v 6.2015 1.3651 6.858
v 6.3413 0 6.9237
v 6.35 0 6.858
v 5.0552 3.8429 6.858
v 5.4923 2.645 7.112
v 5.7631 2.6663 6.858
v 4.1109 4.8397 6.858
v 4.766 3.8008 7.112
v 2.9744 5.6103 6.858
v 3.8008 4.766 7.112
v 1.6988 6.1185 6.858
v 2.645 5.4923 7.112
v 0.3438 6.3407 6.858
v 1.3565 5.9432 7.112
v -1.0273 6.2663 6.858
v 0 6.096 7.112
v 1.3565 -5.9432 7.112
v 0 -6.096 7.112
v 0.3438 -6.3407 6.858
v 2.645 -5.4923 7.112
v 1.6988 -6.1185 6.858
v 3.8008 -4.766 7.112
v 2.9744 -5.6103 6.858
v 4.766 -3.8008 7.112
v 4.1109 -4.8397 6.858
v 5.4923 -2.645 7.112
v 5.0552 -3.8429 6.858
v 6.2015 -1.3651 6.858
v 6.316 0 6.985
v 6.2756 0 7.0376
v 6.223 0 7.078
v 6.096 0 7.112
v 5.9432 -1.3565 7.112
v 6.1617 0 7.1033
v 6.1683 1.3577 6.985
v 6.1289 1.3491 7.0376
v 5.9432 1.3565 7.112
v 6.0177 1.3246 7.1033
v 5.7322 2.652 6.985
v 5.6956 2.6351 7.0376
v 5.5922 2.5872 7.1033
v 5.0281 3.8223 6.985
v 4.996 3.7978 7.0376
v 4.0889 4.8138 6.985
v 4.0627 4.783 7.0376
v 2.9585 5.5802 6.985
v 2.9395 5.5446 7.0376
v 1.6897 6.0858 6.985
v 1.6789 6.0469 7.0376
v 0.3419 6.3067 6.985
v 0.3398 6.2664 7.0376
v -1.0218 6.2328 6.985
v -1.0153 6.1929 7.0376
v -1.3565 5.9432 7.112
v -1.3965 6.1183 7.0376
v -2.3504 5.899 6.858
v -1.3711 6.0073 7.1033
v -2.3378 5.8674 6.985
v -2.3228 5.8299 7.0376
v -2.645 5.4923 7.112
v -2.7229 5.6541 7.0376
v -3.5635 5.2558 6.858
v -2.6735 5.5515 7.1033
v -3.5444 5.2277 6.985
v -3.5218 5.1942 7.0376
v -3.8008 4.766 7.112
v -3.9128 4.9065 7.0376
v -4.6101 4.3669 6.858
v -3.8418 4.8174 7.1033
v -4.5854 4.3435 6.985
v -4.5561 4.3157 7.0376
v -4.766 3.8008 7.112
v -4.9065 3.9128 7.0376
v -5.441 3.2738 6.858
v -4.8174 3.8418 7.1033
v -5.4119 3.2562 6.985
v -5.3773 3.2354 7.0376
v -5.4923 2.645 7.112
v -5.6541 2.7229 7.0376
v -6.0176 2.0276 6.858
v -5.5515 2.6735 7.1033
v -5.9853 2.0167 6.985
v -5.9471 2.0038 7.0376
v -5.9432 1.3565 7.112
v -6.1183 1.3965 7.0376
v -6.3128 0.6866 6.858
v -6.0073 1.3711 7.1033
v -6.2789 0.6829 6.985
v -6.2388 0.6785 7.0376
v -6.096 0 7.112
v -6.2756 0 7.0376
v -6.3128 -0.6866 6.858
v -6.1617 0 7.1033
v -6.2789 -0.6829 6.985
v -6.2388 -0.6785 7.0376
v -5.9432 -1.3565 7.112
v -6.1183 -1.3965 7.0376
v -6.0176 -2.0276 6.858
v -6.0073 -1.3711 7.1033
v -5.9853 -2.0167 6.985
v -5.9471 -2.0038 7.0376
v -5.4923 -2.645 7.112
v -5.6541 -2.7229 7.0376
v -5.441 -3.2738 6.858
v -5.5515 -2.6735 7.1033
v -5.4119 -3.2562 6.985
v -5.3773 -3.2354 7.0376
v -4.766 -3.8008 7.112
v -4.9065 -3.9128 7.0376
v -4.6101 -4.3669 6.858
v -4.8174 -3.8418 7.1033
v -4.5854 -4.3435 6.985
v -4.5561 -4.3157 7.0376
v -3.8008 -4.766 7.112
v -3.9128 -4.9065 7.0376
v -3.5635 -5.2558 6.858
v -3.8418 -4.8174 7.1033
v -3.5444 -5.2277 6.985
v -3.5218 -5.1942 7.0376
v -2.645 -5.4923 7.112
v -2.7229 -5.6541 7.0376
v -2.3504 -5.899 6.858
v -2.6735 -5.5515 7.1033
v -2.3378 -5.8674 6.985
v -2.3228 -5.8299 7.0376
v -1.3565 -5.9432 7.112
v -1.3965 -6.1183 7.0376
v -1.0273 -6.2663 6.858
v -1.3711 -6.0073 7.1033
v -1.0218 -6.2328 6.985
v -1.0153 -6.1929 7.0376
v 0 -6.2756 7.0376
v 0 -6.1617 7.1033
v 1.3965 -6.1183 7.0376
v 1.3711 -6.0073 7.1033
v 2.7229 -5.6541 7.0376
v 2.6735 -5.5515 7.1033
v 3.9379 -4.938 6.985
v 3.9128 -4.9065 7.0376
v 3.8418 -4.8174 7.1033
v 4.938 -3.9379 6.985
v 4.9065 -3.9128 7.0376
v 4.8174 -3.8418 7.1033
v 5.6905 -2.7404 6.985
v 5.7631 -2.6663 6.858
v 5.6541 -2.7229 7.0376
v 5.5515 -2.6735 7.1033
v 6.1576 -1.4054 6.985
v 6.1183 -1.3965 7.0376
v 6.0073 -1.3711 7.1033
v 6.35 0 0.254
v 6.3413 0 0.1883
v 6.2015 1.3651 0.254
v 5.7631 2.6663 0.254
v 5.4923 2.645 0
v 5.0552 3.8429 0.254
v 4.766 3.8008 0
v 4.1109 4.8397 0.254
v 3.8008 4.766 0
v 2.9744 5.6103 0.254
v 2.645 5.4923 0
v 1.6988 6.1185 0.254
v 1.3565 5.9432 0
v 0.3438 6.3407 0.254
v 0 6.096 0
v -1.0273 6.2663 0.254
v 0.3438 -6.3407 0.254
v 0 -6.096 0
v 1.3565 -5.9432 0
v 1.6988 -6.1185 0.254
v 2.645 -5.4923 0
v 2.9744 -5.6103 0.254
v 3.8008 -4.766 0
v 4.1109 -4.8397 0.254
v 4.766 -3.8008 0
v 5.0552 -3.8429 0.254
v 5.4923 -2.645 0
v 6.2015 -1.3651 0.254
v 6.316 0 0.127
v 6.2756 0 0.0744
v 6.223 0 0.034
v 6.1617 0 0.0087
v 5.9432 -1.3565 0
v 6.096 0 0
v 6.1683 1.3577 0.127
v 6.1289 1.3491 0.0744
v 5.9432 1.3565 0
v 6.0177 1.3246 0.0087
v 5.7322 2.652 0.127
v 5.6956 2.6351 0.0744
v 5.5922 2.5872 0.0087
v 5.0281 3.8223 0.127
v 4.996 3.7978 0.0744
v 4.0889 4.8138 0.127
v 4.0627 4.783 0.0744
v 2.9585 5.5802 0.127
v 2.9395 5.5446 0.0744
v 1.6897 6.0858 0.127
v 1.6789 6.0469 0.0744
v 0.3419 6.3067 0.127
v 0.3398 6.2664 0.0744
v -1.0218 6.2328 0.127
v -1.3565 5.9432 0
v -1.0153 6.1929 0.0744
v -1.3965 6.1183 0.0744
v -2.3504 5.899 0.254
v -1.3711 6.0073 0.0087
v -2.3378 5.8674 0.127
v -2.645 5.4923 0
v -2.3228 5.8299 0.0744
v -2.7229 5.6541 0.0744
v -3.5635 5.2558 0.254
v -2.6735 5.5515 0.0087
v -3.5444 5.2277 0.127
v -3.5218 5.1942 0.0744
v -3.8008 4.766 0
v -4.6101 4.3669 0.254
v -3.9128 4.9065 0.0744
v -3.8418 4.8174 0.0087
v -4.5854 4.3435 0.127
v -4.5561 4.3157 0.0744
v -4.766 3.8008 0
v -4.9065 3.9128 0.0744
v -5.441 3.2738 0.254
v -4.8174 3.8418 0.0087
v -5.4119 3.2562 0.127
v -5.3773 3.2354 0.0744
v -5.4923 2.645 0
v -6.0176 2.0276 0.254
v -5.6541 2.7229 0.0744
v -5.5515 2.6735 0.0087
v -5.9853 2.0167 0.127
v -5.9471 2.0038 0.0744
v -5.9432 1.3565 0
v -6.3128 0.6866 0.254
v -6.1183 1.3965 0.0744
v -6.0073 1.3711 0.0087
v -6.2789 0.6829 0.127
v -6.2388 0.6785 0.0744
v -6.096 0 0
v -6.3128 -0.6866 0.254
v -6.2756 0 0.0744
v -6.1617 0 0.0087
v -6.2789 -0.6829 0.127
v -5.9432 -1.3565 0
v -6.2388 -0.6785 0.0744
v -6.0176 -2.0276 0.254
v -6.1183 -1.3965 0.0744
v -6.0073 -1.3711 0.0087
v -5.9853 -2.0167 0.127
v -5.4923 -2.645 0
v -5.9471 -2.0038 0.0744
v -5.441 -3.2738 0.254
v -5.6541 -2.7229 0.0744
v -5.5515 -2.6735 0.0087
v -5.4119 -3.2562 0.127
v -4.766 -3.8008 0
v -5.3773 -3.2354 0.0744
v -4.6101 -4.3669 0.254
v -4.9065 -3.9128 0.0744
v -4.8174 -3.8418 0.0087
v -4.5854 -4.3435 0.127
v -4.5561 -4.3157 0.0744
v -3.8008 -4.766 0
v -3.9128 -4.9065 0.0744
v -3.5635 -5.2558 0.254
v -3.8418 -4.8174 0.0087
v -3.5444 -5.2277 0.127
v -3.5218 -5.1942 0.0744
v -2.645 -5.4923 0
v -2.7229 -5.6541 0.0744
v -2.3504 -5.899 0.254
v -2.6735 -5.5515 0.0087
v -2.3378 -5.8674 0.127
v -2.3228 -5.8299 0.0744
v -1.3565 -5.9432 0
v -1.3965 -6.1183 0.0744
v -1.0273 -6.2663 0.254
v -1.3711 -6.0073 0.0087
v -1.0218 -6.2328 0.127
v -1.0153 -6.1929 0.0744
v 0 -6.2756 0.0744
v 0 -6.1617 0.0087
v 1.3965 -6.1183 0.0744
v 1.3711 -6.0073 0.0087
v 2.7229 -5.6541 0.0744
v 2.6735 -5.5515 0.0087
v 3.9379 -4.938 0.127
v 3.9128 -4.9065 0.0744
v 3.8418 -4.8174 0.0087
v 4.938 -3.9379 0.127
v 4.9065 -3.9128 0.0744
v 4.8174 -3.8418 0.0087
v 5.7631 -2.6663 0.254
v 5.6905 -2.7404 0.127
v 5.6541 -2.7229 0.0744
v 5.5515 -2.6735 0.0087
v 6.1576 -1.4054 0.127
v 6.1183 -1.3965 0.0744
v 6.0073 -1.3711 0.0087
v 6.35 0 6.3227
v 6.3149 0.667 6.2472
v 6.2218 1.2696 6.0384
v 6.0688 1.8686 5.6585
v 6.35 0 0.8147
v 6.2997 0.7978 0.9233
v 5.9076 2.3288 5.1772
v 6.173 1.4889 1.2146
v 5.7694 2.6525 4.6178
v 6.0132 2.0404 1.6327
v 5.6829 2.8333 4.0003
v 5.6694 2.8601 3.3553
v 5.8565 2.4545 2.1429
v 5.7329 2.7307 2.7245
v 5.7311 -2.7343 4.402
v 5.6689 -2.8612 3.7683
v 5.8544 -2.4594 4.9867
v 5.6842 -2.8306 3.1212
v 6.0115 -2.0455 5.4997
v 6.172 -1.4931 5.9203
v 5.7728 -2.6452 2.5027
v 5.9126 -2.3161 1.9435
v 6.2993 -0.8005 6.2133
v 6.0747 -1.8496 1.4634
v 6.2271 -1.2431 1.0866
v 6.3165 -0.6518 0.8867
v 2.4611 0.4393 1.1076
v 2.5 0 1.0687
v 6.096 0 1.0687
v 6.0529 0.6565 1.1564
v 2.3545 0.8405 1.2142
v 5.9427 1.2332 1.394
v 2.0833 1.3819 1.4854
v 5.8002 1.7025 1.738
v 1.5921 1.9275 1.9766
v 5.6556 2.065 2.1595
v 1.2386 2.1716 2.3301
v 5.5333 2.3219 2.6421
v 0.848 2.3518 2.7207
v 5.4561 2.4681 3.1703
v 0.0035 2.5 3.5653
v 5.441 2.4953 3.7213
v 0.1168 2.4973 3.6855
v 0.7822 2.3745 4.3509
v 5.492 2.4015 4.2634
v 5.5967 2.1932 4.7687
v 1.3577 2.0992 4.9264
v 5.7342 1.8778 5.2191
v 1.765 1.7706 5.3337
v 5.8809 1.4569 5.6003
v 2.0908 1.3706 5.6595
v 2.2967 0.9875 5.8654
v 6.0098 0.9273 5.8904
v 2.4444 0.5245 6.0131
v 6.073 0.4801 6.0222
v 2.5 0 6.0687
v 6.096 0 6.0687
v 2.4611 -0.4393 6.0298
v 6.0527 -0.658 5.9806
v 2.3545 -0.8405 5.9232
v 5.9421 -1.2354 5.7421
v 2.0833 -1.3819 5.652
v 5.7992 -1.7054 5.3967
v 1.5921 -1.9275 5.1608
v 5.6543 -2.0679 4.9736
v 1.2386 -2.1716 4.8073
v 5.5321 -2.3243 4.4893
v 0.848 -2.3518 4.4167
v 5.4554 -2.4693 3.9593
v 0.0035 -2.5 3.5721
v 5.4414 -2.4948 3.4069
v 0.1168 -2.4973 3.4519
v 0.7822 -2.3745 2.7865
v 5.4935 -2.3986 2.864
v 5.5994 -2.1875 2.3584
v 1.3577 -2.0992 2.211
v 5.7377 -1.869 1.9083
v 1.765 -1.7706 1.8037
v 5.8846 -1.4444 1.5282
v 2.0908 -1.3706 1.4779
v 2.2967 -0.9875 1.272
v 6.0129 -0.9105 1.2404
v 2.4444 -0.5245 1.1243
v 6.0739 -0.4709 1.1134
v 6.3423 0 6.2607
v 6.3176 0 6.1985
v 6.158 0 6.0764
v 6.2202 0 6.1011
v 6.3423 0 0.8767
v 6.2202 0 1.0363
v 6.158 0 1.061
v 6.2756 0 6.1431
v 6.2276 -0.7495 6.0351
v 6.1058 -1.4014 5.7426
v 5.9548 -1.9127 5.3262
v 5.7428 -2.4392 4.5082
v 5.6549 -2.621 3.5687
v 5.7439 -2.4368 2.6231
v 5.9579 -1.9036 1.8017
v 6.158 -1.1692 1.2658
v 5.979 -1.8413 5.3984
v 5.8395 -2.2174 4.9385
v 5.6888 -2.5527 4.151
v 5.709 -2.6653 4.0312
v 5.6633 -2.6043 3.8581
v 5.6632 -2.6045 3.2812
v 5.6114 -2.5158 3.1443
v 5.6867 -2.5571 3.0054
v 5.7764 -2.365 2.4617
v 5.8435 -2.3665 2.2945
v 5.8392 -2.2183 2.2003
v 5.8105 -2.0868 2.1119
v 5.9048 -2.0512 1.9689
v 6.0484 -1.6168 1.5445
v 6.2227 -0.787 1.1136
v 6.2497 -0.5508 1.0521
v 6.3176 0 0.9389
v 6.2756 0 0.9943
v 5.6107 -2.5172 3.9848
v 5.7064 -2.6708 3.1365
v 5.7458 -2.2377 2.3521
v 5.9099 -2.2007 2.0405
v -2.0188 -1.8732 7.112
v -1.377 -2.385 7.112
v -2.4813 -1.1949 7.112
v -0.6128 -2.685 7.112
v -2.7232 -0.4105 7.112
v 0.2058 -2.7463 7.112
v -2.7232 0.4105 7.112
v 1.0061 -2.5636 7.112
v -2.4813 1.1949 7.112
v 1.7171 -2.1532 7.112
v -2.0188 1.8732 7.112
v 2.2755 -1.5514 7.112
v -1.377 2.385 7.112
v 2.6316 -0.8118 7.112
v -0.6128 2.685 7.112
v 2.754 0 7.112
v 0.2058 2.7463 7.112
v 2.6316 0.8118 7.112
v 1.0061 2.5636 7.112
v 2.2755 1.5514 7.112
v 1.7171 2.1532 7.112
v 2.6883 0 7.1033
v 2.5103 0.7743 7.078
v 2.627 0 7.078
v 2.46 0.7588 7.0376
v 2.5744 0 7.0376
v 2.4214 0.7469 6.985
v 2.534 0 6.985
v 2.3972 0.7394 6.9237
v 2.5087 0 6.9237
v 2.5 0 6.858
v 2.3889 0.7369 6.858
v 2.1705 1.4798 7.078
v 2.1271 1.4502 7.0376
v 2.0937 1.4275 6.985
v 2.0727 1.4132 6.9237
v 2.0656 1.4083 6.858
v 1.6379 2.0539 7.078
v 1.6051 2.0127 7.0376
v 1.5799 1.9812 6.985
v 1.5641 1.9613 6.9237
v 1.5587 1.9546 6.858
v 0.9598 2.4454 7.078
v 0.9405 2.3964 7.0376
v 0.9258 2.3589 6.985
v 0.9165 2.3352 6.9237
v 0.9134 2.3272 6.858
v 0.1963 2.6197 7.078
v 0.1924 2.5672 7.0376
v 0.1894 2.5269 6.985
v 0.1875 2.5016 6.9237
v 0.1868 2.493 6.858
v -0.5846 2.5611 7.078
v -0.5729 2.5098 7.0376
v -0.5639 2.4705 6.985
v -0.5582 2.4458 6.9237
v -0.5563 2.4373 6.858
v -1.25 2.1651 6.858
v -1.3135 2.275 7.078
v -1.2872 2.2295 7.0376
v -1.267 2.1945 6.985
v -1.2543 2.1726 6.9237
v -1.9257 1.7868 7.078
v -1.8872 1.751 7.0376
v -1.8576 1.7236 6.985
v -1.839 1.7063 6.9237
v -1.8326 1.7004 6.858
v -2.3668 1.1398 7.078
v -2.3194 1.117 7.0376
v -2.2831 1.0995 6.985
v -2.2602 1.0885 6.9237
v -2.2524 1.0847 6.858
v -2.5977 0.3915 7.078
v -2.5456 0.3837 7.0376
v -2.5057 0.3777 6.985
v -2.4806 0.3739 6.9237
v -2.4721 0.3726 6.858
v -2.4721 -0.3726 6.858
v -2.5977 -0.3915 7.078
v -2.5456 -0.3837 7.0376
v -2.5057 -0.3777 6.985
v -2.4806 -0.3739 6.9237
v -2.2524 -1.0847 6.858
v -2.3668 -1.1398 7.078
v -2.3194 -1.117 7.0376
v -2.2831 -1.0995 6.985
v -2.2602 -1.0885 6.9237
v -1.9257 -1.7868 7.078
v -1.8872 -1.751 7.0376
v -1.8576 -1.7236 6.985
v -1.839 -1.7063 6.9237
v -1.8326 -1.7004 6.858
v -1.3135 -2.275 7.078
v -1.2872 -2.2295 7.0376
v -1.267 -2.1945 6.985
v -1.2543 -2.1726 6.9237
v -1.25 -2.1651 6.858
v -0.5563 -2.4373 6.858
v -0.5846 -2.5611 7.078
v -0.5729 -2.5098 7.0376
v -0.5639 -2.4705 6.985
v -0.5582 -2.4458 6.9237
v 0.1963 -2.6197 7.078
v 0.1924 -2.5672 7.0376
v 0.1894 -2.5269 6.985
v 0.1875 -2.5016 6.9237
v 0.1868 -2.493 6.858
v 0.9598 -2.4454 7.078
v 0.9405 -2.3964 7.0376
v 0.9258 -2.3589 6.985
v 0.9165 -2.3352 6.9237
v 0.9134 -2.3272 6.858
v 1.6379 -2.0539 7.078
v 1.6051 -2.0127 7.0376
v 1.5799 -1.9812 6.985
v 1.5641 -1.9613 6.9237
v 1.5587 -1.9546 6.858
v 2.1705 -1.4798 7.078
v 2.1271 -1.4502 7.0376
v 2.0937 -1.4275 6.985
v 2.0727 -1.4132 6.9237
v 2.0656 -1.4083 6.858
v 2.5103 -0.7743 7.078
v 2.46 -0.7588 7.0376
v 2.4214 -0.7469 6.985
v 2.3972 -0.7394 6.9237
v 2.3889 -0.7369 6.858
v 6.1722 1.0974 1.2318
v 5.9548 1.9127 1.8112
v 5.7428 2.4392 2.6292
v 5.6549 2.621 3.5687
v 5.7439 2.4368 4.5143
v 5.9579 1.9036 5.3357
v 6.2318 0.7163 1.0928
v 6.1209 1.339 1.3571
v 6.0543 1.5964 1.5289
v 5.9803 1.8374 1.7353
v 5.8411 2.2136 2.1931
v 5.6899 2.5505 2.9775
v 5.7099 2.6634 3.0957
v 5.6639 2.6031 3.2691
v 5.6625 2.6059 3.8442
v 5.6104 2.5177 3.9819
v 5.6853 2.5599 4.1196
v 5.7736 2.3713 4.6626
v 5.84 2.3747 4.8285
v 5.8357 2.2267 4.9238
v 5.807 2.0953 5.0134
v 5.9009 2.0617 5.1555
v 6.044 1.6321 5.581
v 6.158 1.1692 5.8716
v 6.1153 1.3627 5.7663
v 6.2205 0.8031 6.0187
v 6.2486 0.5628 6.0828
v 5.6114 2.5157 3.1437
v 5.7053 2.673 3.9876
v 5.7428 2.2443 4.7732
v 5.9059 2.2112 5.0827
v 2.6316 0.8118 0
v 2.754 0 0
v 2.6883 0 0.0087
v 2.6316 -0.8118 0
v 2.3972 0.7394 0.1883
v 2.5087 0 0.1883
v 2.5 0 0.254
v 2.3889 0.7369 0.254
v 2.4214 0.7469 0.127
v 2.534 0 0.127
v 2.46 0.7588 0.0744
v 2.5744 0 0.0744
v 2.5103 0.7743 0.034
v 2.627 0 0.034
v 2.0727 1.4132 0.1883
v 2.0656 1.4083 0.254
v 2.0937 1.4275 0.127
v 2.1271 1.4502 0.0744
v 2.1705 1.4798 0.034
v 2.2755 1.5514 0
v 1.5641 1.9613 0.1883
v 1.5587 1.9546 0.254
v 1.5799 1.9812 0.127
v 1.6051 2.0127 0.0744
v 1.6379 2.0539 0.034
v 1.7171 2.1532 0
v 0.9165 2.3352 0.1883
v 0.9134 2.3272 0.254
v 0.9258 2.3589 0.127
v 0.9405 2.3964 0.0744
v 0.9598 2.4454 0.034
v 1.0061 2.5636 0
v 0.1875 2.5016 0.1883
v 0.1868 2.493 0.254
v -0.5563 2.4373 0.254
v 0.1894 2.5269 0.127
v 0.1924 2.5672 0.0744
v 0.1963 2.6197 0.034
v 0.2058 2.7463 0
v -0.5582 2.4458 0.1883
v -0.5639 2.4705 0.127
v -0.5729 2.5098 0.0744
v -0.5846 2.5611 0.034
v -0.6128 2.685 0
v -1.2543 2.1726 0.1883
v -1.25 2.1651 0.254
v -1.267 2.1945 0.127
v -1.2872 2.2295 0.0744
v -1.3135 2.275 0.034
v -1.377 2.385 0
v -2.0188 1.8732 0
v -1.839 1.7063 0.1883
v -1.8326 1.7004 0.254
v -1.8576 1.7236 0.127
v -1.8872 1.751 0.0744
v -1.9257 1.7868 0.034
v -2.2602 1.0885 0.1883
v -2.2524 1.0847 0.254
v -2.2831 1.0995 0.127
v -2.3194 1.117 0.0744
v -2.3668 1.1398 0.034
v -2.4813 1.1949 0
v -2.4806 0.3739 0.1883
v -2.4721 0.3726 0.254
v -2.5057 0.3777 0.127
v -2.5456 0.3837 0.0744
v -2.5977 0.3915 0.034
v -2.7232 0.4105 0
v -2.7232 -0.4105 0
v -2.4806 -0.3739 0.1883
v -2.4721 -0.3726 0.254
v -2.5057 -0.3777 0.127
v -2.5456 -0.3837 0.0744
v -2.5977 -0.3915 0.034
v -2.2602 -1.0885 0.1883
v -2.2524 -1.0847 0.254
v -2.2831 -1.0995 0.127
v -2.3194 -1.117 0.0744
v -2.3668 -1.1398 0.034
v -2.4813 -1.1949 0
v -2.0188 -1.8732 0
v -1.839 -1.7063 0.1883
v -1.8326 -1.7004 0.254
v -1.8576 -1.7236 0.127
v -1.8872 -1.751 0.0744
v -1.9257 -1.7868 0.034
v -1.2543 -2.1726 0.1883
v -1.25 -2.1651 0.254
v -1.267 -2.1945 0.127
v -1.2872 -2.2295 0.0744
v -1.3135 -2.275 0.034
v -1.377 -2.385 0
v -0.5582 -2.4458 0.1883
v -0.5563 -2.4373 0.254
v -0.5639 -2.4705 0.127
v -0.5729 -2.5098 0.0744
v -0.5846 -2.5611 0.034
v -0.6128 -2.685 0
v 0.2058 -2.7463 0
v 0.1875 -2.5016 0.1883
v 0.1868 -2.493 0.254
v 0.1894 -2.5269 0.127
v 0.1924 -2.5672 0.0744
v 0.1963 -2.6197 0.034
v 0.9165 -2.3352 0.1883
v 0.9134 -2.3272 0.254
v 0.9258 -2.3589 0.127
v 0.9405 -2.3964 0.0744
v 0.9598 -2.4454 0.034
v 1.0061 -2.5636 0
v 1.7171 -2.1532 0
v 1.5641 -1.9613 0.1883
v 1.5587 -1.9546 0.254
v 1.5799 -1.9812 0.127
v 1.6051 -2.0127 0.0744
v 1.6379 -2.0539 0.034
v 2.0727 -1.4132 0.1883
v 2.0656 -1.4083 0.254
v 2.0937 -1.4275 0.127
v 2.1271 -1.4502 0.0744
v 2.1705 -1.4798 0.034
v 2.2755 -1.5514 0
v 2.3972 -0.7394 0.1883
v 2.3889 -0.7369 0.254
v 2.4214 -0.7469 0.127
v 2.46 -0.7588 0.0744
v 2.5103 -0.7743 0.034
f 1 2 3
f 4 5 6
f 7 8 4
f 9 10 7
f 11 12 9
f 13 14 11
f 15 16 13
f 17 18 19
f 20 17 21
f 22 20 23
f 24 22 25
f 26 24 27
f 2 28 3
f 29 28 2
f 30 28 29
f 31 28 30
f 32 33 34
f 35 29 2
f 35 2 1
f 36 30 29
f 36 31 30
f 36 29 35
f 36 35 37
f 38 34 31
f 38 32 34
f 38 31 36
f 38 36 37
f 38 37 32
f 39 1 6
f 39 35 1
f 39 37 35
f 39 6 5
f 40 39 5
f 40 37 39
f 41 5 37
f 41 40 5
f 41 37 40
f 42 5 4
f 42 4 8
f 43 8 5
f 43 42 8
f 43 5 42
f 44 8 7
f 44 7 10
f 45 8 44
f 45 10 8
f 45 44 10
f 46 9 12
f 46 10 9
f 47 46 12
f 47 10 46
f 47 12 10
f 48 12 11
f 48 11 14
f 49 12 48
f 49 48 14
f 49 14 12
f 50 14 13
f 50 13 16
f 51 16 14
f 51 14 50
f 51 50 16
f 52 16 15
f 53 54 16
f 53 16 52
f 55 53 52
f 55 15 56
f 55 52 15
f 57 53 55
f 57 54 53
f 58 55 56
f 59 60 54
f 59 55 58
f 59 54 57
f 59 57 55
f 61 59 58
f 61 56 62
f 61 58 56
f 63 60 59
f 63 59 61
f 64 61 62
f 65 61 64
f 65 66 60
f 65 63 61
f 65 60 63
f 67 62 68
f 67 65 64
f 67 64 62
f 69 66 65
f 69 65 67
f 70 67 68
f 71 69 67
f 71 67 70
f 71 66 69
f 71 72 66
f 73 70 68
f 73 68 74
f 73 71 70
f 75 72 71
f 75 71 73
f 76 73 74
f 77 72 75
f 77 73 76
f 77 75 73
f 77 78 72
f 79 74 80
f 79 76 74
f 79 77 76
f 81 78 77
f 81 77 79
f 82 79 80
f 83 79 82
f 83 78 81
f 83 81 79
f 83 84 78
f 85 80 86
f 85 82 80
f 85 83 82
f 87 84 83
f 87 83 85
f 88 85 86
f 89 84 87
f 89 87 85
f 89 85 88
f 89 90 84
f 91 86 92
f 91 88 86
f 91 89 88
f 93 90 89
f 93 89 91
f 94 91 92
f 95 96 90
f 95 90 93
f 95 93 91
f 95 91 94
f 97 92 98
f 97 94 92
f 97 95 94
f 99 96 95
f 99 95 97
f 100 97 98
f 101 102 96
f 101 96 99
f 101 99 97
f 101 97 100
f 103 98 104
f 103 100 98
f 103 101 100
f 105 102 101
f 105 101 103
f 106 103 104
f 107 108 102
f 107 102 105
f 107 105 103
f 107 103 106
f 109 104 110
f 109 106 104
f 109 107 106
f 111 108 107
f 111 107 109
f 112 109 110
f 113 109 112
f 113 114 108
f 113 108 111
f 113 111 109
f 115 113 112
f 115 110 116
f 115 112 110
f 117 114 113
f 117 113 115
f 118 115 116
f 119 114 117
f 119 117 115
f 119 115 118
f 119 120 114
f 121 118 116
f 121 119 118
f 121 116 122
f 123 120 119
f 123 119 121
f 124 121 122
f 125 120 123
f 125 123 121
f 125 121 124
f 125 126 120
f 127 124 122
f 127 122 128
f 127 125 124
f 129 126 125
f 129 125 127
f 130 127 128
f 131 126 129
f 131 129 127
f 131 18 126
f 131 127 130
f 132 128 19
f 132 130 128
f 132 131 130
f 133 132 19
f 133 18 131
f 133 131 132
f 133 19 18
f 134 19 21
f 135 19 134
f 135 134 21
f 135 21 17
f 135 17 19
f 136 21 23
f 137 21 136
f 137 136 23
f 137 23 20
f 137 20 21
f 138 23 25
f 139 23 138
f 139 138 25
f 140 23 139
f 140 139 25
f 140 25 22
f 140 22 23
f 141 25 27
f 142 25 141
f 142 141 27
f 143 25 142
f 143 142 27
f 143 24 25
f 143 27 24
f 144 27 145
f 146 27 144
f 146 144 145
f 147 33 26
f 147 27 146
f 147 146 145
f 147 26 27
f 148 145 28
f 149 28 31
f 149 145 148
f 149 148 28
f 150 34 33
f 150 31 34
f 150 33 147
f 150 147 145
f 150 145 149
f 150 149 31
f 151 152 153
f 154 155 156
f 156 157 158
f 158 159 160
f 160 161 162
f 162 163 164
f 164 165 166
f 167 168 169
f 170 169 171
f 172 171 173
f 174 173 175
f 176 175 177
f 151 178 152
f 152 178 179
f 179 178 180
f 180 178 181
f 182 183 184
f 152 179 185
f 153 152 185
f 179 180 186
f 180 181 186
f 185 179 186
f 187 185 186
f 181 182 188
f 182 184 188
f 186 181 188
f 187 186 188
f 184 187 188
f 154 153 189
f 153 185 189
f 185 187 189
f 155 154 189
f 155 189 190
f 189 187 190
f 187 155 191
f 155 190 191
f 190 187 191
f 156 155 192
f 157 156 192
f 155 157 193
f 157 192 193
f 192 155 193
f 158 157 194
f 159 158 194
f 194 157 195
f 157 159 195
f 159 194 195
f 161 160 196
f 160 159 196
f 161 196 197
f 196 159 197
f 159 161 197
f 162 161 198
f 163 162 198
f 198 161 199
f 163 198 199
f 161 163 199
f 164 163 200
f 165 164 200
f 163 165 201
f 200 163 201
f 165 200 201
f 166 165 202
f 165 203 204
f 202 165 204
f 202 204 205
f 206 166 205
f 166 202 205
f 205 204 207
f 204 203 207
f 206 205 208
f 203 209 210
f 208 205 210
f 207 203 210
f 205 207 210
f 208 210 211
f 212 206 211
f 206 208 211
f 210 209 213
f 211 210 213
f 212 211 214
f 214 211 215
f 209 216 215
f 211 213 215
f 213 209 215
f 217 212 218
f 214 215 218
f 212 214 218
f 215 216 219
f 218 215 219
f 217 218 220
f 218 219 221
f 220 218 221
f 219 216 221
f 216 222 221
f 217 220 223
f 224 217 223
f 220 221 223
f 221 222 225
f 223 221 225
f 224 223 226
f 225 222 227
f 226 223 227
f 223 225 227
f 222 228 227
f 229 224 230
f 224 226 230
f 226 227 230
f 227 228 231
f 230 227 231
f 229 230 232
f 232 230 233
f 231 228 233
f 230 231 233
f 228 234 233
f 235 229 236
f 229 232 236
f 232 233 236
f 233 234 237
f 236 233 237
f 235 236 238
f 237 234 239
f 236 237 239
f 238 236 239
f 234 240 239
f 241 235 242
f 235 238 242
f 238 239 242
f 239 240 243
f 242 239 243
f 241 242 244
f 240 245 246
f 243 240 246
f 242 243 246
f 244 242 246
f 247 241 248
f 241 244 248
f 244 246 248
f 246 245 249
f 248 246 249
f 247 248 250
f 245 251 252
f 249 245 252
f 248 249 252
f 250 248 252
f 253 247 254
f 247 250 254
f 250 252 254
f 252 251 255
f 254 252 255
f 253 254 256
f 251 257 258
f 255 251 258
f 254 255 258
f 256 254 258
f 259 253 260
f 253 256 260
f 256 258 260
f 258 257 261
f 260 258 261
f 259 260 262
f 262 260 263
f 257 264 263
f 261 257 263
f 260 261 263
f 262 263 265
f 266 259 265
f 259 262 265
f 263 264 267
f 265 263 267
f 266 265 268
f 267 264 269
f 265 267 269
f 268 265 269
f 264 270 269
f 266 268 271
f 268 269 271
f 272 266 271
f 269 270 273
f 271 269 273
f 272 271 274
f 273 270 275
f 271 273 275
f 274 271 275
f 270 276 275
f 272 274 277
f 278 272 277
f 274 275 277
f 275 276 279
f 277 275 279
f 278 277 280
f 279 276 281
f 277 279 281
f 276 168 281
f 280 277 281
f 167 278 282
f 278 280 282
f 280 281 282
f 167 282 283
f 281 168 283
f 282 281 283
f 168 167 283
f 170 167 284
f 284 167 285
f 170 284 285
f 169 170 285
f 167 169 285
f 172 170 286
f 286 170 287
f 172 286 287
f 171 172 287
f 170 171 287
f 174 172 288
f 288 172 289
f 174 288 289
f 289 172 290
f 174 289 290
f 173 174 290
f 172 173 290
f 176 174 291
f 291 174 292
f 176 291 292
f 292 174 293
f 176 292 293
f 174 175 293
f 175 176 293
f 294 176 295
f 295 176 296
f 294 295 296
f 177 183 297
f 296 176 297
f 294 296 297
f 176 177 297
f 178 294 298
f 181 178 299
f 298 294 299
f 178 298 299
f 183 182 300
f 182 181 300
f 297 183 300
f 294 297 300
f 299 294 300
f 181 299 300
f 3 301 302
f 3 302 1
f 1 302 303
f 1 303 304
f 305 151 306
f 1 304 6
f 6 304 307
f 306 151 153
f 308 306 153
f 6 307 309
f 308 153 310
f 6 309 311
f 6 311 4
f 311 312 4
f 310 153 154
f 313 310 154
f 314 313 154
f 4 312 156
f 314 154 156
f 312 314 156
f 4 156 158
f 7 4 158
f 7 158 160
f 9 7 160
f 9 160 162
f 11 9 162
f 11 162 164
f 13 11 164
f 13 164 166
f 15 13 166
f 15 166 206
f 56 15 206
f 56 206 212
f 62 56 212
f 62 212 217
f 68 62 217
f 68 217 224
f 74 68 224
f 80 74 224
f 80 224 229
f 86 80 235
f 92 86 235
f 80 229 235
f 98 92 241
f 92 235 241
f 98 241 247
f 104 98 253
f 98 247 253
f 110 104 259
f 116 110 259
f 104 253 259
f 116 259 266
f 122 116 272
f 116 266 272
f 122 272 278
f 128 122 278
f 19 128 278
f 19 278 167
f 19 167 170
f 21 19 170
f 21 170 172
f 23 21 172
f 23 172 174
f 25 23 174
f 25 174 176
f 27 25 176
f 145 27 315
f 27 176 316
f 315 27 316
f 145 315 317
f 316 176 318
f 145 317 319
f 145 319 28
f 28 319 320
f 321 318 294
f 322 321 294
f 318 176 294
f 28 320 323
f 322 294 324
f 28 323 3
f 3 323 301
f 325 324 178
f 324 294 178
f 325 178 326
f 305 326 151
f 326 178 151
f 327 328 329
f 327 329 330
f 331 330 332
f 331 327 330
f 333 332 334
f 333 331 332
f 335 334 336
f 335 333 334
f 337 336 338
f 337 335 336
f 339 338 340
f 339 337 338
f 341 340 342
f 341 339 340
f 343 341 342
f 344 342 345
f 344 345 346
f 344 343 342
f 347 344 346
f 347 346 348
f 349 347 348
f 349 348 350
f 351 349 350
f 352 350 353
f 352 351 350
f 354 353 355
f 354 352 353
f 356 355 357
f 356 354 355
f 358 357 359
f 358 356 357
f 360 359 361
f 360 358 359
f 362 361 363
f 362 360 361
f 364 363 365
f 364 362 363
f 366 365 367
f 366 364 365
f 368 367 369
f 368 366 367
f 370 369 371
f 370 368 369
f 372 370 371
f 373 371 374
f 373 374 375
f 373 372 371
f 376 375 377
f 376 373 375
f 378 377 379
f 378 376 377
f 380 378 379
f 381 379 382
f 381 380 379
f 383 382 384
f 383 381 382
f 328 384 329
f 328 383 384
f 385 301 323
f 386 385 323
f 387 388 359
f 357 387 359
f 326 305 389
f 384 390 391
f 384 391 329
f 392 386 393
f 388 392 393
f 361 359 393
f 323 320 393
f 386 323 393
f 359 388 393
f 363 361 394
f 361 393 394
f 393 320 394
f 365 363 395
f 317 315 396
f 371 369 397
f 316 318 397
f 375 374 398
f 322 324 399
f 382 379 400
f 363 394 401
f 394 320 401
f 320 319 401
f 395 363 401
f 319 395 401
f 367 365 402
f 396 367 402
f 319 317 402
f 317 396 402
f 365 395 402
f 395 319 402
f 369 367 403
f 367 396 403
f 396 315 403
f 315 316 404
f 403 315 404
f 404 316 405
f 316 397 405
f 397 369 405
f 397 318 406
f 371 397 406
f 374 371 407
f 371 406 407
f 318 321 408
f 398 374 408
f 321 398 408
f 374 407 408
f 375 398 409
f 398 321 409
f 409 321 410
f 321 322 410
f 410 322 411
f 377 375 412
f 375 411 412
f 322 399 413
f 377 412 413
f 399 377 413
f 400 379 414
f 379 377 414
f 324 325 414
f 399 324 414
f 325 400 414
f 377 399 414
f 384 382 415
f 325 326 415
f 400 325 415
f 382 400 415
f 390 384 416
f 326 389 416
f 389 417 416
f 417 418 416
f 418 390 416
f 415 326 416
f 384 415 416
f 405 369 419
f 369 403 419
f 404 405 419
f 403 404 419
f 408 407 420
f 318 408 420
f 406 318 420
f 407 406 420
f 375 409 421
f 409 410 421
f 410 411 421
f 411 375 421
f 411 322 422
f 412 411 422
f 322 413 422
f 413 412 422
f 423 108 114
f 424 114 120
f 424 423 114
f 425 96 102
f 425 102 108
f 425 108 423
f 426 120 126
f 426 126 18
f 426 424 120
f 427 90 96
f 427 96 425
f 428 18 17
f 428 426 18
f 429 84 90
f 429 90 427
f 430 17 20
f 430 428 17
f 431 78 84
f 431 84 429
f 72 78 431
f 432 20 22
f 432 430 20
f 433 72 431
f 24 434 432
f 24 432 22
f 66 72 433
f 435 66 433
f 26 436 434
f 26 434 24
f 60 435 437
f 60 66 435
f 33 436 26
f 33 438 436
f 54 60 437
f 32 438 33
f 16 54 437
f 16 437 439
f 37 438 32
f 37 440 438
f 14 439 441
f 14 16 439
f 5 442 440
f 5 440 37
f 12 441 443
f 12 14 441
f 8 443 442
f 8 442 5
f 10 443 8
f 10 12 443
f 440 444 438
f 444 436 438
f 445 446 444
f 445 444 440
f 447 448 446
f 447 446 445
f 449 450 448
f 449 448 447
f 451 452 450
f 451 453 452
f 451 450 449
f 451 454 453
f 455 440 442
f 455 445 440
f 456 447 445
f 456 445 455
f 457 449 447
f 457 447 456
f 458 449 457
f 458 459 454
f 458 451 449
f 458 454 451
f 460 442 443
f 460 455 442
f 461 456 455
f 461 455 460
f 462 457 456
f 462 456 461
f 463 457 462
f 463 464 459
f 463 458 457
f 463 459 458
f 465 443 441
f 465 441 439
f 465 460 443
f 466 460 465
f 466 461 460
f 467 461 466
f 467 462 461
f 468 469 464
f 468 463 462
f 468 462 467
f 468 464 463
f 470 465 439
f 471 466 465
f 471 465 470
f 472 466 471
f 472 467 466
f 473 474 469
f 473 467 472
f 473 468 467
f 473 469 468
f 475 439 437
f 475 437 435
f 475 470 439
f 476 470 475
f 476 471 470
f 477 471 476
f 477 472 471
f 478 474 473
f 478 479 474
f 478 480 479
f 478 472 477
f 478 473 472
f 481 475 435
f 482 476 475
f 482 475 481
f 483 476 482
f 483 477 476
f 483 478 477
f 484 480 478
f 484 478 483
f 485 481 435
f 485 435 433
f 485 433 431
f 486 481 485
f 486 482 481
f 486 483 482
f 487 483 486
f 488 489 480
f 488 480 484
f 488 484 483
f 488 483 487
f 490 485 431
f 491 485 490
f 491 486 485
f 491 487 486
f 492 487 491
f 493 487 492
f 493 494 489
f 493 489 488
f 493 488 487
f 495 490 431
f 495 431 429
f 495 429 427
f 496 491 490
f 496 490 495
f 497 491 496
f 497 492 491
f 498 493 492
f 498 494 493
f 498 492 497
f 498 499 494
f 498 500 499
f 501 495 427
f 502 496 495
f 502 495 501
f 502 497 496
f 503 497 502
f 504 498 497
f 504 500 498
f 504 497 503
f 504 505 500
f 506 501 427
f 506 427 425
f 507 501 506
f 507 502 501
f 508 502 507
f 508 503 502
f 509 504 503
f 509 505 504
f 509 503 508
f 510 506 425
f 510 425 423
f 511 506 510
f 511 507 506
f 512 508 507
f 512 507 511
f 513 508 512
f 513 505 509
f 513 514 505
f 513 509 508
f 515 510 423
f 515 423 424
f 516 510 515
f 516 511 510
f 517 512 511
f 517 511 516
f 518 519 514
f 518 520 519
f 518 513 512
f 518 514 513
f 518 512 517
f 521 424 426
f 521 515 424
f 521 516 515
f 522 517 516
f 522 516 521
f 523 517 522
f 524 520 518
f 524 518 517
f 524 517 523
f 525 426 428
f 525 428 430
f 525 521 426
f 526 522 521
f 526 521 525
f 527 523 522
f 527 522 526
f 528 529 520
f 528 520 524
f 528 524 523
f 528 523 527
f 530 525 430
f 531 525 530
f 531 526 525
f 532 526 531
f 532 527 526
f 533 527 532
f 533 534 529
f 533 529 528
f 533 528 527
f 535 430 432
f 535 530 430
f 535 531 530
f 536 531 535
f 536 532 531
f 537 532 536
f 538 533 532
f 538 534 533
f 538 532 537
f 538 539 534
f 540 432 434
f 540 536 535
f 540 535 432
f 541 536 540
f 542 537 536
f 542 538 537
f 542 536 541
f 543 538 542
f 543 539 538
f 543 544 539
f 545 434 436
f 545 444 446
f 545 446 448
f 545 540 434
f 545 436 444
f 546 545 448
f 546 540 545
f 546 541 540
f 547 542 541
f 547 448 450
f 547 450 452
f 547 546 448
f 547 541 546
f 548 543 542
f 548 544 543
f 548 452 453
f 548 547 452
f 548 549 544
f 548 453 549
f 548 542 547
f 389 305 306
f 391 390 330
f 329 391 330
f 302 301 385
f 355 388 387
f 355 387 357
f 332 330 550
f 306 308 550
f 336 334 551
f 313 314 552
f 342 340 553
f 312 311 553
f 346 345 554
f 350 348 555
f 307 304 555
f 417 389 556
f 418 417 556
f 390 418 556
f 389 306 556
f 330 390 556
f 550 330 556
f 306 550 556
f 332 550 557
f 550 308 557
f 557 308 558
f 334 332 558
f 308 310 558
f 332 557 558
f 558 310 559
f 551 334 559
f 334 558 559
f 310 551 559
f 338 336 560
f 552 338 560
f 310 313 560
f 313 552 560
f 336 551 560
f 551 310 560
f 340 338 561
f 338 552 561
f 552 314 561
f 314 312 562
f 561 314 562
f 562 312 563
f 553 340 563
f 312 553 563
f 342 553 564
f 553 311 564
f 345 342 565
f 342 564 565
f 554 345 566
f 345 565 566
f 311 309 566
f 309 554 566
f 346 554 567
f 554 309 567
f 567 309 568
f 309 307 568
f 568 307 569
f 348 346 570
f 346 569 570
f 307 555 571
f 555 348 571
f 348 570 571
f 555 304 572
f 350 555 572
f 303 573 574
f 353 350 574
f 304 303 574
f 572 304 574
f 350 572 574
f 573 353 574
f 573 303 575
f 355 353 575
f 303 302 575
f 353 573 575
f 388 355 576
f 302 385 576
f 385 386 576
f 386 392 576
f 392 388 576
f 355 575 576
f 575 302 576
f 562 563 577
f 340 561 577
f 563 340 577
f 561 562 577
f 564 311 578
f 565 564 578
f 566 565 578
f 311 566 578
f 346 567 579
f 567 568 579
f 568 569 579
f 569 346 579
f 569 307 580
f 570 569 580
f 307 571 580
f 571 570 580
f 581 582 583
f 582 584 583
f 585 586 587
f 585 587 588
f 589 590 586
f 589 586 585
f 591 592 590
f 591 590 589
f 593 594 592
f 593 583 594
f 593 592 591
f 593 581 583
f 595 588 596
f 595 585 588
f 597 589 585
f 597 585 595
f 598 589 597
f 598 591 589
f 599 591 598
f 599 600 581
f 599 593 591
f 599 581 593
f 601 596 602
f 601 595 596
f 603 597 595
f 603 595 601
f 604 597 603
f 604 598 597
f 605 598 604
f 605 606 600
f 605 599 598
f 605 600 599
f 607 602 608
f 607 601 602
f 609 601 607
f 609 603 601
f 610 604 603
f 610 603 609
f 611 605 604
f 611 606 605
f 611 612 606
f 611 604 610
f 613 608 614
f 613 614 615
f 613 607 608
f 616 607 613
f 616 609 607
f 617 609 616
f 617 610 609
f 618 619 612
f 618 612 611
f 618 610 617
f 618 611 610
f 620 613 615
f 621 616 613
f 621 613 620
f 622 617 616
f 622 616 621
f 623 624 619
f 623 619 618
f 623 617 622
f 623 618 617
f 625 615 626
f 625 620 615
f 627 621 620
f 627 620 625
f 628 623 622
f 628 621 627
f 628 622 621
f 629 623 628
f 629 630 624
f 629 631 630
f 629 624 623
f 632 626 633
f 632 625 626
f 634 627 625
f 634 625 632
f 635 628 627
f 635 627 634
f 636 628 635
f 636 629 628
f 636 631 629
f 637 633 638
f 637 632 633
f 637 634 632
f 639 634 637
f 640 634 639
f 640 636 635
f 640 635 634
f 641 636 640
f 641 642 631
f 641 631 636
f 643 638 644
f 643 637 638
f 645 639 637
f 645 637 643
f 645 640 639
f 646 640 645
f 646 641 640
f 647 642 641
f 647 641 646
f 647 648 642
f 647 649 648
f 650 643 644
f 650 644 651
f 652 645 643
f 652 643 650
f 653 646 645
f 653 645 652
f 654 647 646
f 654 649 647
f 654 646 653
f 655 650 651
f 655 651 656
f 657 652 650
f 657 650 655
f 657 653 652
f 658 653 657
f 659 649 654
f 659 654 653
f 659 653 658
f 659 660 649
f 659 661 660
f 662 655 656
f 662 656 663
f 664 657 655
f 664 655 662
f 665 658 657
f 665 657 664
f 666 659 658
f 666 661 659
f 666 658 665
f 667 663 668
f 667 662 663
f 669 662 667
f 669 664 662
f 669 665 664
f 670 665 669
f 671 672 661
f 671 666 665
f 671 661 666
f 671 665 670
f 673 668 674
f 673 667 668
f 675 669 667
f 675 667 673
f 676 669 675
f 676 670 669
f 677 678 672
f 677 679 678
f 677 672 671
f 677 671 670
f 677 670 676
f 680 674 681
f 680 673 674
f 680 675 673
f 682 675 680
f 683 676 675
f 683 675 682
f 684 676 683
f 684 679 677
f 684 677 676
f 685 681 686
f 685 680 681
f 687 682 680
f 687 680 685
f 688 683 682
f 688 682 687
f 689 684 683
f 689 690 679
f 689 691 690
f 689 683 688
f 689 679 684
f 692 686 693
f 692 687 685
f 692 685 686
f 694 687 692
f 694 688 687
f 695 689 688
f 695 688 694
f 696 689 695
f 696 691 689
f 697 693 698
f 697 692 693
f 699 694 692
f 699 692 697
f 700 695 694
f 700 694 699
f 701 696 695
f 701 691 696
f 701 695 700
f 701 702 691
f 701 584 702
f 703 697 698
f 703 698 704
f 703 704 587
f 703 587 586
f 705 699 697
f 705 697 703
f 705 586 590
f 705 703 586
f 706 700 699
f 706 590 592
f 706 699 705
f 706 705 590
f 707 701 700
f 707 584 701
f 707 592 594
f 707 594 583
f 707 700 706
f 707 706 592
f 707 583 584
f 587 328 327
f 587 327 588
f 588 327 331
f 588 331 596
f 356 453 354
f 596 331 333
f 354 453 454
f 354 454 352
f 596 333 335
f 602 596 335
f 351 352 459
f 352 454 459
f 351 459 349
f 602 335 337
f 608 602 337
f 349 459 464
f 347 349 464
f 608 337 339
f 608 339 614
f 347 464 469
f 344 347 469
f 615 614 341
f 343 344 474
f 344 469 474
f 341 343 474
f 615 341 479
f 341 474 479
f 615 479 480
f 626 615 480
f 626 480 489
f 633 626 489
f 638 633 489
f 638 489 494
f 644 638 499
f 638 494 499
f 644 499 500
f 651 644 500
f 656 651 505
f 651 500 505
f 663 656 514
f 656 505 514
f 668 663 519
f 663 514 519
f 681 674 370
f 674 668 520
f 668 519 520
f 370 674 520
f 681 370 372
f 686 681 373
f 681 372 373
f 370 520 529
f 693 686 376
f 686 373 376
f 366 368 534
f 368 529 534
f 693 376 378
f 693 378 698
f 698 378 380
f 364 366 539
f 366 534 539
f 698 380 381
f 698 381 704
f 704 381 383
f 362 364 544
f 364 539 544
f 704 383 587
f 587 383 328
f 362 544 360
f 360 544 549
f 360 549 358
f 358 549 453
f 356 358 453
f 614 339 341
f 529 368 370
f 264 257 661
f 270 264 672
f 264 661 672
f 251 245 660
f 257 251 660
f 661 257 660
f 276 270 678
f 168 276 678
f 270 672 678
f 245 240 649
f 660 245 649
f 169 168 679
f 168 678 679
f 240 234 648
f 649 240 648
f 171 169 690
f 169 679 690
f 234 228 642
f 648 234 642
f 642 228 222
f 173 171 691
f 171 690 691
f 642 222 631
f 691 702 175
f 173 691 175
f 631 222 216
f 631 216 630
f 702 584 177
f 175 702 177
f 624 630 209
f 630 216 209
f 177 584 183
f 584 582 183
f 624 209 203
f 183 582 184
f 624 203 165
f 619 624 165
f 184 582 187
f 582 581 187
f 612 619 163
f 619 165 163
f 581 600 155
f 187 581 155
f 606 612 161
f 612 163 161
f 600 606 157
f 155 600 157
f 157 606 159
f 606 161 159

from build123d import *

# Parameters (mm, degrees)
SKETCH2_R           = 6.35
BOSS_EXTRUDE1_DEPTH = 7.112
SKETCH3_R           = 2.5
CUT_EXTRUDE1_DEPTH  = 19.05
SKETCH4_R           = 2.499999953
CUT_EXTRUDE2_DEPTH  = 19.05
FILLET1_R           = 0.254


with BuildPart() as part:
    # Sketch2 → Boss-Extrude1 (new body)
    with BuildSketch(Plane.XY):
        Circle(SKETCH2_R)
    extrude(amount=BOSS_EXTRUDE1_DEPTH)

    # Sketch3 → Cut-Extrude1 (cut)
    with BuildSketch(Plane.XY.offset(7.112)):
        Circle(SKETCH3_R)
    extrude(amount=-CUT_EXTRUDE1_DEPTH, mode=Mode.SUBTRACT)

    # Sketch4 → Cut-Extrude2 (cut)
    with BuildSketch(Plane(origin=(0, 0, 0), x_dir=(0, 0, -1), z_dir=(1, 0, 0))):
        with Locations((-3.5687, 0)):
            Circle(SKETCH4_R)
    extrude(amount=CUT_EXTRUDE2_DEPTH, mode=Mode.SUBTRACT)

    # Fillet1
    fillet1_edges = [part.edges().sort_by_distance(p)[0] for p in [
        (5.837165428, 2.499999953, 3.5687),
        (-6.35, 0, 0),
        (-6.35, 0, 7.112),
        (-2.5, 0, 0),
        (-2.5, 0, 7.112),
    ]]
    fillet(fillet1_edges, radius=FILLET1_R)


solid = part.part
